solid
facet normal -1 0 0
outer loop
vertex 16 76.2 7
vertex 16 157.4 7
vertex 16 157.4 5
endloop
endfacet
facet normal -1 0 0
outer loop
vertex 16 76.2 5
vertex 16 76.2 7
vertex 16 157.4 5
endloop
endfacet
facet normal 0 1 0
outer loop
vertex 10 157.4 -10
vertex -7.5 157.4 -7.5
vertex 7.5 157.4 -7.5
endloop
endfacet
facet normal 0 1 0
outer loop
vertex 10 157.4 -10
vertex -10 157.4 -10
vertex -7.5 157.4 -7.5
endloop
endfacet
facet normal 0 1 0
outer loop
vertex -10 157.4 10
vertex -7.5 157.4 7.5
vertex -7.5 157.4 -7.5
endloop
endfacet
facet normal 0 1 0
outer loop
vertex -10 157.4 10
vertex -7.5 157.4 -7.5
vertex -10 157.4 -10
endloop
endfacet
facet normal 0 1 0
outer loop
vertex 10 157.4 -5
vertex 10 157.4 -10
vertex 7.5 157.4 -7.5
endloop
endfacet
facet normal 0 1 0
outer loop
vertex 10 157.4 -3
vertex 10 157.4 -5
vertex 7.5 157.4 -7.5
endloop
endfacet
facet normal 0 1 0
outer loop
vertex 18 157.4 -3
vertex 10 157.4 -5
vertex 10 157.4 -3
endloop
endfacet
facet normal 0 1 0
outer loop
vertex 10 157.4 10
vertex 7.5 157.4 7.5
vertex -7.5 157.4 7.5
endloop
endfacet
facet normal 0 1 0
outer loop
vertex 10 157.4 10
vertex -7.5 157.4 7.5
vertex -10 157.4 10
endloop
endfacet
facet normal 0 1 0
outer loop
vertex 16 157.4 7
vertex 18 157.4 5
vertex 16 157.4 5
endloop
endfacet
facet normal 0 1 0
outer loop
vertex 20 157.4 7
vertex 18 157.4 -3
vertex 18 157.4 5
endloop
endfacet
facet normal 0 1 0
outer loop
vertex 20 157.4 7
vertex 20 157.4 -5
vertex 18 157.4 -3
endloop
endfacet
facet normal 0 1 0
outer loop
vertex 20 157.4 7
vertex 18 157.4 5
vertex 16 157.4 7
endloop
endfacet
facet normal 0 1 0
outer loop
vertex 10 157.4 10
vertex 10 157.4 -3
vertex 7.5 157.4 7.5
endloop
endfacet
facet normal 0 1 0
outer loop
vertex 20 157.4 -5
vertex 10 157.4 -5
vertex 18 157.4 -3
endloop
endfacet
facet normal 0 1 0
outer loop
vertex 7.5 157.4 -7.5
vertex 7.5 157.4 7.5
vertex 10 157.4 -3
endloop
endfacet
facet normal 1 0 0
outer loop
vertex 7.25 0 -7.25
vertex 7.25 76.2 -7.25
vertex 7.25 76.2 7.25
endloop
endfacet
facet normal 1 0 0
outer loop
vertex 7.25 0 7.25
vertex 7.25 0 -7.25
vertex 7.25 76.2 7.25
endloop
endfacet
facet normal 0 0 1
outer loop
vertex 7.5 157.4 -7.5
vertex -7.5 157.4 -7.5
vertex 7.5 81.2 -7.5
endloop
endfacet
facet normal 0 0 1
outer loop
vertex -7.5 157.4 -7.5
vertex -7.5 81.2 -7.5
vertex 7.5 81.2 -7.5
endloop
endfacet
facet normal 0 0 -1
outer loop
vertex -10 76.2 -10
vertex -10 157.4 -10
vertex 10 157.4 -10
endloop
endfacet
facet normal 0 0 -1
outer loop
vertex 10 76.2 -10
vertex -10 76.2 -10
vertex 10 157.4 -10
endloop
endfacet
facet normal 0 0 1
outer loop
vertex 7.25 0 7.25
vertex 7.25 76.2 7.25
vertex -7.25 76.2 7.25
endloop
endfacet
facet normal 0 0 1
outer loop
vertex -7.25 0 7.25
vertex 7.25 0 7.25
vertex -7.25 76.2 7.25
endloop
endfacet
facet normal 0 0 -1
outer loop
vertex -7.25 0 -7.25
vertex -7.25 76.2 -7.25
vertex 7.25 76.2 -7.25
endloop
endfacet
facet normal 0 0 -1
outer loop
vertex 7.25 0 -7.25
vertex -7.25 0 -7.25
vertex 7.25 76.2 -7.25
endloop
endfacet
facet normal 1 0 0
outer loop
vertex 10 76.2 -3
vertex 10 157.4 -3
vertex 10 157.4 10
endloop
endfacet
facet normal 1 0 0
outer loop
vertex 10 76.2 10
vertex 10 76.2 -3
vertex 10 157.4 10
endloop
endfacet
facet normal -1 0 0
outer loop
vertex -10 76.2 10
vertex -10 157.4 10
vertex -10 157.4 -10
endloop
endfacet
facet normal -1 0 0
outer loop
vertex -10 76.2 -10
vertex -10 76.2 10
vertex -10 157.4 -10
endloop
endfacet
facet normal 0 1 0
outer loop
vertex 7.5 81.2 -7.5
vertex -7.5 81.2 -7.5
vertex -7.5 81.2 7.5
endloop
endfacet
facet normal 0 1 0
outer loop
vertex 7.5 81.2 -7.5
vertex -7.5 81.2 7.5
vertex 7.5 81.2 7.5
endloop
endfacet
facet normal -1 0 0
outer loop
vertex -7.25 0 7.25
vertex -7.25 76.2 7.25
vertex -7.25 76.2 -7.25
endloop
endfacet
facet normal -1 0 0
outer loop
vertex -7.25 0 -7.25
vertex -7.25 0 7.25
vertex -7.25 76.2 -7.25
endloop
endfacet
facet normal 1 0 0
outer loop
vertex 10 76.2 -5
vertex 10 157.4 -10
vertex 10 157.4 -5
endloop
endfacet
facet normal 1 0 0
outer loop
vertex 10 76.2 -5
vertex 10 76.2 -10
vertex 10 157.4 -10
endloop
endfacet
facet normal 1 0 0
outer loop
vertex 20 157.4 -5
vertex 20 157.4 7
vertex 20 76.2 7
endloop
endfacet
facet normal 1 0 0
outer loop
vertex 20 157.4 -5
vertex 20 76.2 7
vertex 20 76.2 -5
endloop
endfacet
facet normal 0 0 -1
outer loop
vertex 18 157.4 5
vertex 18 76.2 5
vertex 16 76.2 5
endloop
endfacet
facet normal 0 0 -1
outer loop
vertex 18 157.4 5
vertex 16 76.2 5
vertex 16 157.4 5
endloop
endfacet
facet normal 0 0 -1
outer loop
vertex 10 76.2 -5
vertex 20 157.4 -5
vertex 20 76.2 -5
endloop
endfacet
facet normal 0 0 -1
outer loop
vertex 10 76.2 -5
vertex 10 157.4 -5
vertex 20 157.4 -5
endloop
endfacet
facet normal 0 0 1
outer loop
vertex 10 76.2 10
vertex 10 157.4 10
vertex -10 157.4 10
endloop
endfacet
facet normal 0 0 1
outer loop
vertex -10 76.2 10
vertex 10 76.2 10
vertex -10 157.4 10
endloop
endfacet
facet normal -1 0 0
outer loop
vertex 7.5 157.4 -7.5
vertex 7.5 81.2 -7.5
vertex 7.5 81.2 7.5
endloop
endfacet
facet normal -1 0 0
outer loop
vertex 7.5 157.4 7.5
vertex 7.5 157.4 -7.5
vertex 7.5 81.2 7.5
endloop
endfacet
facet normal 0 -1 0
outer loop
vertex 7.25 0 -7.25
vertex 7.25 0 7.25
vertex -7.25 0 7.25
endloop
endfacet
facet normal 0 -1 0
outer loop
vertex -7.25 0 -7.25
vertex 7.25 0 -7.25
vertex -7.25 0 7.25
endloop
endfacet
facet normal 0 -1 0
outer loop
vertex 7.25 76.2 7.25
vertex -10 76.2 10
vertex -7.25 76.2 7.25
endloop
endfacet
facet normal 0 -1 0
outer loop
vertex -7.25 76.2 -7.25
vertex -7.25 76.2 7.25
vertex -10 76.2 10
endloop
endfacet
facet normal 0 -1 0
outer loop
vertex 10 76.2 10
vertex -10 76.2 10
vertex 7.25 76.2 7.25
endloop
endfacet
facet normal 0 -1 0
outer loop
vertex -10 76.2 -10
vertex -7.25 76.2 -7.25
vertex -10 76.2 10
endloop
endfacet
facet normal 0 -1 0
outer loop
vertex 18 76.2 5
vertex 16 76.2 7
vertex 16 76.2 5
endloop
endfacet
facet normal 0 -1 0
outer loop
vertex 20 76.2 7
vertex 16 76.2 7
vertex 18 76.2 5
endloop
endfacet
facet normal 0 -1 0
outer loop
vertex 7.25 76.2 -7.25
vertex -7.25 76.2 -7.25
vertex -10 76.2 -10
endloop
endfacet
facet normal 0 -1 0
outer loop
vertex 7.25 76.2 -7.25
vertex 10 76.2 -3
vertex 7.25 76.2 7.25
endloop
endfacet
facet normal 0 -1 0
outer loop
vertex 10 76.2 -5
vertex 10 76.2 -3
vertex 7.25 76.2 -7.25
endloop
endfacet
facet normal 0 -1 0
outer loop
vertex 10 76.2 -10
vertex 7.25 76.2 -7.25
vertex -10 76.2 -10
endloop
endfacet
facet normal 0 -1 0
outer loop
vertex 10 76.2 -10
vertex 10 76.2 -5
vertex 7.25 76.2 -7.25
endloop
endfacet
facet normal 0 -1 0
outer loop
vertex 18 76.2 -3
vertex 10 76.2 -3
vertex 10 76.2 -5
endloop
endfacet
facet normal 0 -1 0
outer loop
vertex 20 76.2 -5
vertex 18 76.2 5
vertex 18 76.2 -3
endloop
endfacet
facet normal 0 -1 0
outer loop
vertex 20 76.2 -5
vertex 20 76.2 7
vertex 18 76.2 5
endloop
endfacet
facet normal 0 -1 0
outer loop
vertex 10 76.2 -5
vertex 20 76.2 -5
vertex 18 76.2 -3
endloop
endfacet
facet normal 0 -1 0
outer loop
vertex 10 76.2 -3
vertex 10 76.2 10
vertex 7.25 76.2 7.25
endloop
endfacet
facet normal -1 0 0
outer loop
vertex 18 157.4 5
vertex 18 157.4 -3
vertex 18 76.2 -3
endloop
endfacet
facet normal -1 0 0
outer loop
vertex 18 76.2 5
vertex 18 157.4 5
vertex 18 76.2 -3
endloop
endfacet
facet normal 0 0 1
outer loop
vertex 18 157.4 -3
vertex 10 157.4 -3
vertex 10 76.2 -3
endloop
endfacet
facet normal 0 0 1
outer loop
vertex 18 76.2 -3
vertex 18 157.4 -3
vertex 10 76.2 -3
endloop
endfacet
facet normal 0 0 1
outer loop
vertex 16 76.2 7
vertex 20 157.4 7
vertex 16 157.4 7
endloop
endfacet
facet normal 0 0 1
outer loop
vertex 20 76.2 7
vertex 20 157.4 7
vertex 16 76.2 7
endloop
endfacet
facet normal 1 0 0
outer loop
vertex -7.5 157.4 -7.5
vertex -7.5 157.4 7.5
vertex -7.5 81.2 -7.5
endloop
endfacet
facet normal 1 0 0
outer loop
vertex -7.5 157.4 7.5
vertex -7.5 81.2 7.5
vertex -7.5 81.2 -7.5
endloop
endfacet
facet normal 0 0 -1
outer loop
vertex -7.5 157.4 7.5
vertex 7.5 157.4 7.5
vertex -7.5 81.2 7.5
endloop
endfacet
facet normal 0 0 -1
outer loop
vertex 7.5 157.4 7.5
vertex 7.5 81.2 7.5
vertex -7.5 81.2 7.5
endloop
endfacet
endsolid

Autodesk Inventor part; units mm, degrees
ref_plane "YZ Plane" through (0, 0, 0) normal (1, 0, 0) x (0, 1, 0)
ref_plane "XZ Plane" through (0, 0, 0) normal (0, 1, 0) x (-1, 0, 0)
ref_plane "XY Plane" through (0, 0, 0) normal (0, 0, 1) x (1, 0, 0)
sketch "Sketch1" plane through (0, 0, 0) normal (0, 1, 0) x (-1, 0, 0)
  line L0 (-7.25, 7.25) -> (7.25, 7.25)
  line L1 (7.25, 7.25) -> (7.25, -7.25)
  line L2 (7.25, -7.25) -> (-7.25, -7.25)
  line L3 (-7.25, -7.25) -> (-7.25, 7.25)
  line L4 (-7.25, 7.25) -> (7.25, -7.25) construction
  line L5 (7.25, 7.25) -> (-7.25, -7.25) construction
  point P0 (0, 0)
  dimension "d0" = 14.5
  dimension "d1" = 14.5
extrude "Extrusion1" add sketch "Sketch1" along normal blind 76.2
sketch "Sketch2" plane through (0, 76.2, 0) normal (0, 1, 0) x (1, 0, 0)
  line L0 (10, -10) -> (-10, -10)
  line L1 (-10, -10) -> (-10, 10)
  line L2 (-10, 10) -> (10, 10)
  line L3 (10, 10) -> (10, -10)
  line L4 (10, -10) -> (-10, 10) construction
  line L5 (-10, -10) -> (10, 10) construction
  point P0 (0, 0)
  dimension "d4" = 20
  dimension "d5" = 20
extrude "Extrusion2" add sketch "Sketch2" along normal blind 5
sketch "Sketch3" plane through (0, 81.2, 0) normal (0, 1, 0) x (1, 0, 0)
  line L0 (7.5, -7.5) -> (-7.5, -7.5)
  line L1 (-7.5, -7.5) -> (-7.5, 7.5)
  line L2 (-7.5, 7.5) -> (7.5, 7.5)
  line L3 (7.5, 7.5) -> (7.5, -7.5)
  line L4 (7.5, -7.5) -> (-7.5, 7.5) construction
  line L5 (-7.5, -7.5) -> (7.5, 7.5) construction
  line L6 (10, -10) -> (-10, -10)
  line L7 (-10, -10) -> (-10, 10)
  line L8 (-10, 10) -> (10, 10)
  line L9 (10, 10) -> (10, -10)
  line L10 (10, -10) -> (-10, 10) construction
  line L11 (-10, -10) -> (10, 10) construction
  point P0 (0, 0)
  dimension "d8" = 15
  dimension "d9" = 15
extrude "Extrusion3" add sketch "Sketch3" along normal blind 76.2
sketch "Sketch4" plane through (10, 76.2, 10) normal (1, 0, 0) x (0, 0, -1)
  line L0 (20, 0) -> (20, 81.2) projected
  line L1 (15, 81.2) -> (15, 0)
  line L2 (0, 0) -> (20, 0) projected
  line L3 (15, 81.2) -> (13, 81.2)
  line L4 (17.5, 81.2) -> (2.5, 81.2) projected
  line L5 (13, 81.2) -> (13, 0)
  line L6 (13, 0) -> (15, 0)
  line L7 (20, 81.2) -> (0, 81.2) projected
  point P0 (10, -76.2)
  dimension "d12" = 2
extrude "Extrusion4" add sketch "Sketch4" along normal blind 10 contours L2 L5 L3 L1
sketch "Sketch5" plane through (10, 76.2, -3) normal (0, 0, 1) x (1, 0, 0)
  line L0 (0, 81.2) -> (10, 81.2) projected
  line L1 (10, 81.2) -> (8, 81.2)
  line L2 (8, 81.2) -> (8, 0)
  line L3 (8, 0) -> (10, 0)
  line L4 (10, 0) -> (10, 81.2)
  point P0 (-10, -76.2)
  dimension "d15" = 2
extrude "Extrusion5" add sketch "Sketch5" along normal blind 8
sketch "Sketch6" plane through (20, 76.2, 10) normal (1, 0, 0) x (0, 0, -1)
  line L0 (5, 81.2) -> (3, 81.2)
  line L1 (3, 81.2) -> (3, 0)
  line L2 (3, 0) -> (5, 0)
  line L3 (5, 0) -> (5, 81.2)
  point P0 (10, -76.2)
  dimension "d18" = 2
extrude "Extrusion6" add sketch "Sketch6" against normal blind 4
properties part number "CraneArmLink"
